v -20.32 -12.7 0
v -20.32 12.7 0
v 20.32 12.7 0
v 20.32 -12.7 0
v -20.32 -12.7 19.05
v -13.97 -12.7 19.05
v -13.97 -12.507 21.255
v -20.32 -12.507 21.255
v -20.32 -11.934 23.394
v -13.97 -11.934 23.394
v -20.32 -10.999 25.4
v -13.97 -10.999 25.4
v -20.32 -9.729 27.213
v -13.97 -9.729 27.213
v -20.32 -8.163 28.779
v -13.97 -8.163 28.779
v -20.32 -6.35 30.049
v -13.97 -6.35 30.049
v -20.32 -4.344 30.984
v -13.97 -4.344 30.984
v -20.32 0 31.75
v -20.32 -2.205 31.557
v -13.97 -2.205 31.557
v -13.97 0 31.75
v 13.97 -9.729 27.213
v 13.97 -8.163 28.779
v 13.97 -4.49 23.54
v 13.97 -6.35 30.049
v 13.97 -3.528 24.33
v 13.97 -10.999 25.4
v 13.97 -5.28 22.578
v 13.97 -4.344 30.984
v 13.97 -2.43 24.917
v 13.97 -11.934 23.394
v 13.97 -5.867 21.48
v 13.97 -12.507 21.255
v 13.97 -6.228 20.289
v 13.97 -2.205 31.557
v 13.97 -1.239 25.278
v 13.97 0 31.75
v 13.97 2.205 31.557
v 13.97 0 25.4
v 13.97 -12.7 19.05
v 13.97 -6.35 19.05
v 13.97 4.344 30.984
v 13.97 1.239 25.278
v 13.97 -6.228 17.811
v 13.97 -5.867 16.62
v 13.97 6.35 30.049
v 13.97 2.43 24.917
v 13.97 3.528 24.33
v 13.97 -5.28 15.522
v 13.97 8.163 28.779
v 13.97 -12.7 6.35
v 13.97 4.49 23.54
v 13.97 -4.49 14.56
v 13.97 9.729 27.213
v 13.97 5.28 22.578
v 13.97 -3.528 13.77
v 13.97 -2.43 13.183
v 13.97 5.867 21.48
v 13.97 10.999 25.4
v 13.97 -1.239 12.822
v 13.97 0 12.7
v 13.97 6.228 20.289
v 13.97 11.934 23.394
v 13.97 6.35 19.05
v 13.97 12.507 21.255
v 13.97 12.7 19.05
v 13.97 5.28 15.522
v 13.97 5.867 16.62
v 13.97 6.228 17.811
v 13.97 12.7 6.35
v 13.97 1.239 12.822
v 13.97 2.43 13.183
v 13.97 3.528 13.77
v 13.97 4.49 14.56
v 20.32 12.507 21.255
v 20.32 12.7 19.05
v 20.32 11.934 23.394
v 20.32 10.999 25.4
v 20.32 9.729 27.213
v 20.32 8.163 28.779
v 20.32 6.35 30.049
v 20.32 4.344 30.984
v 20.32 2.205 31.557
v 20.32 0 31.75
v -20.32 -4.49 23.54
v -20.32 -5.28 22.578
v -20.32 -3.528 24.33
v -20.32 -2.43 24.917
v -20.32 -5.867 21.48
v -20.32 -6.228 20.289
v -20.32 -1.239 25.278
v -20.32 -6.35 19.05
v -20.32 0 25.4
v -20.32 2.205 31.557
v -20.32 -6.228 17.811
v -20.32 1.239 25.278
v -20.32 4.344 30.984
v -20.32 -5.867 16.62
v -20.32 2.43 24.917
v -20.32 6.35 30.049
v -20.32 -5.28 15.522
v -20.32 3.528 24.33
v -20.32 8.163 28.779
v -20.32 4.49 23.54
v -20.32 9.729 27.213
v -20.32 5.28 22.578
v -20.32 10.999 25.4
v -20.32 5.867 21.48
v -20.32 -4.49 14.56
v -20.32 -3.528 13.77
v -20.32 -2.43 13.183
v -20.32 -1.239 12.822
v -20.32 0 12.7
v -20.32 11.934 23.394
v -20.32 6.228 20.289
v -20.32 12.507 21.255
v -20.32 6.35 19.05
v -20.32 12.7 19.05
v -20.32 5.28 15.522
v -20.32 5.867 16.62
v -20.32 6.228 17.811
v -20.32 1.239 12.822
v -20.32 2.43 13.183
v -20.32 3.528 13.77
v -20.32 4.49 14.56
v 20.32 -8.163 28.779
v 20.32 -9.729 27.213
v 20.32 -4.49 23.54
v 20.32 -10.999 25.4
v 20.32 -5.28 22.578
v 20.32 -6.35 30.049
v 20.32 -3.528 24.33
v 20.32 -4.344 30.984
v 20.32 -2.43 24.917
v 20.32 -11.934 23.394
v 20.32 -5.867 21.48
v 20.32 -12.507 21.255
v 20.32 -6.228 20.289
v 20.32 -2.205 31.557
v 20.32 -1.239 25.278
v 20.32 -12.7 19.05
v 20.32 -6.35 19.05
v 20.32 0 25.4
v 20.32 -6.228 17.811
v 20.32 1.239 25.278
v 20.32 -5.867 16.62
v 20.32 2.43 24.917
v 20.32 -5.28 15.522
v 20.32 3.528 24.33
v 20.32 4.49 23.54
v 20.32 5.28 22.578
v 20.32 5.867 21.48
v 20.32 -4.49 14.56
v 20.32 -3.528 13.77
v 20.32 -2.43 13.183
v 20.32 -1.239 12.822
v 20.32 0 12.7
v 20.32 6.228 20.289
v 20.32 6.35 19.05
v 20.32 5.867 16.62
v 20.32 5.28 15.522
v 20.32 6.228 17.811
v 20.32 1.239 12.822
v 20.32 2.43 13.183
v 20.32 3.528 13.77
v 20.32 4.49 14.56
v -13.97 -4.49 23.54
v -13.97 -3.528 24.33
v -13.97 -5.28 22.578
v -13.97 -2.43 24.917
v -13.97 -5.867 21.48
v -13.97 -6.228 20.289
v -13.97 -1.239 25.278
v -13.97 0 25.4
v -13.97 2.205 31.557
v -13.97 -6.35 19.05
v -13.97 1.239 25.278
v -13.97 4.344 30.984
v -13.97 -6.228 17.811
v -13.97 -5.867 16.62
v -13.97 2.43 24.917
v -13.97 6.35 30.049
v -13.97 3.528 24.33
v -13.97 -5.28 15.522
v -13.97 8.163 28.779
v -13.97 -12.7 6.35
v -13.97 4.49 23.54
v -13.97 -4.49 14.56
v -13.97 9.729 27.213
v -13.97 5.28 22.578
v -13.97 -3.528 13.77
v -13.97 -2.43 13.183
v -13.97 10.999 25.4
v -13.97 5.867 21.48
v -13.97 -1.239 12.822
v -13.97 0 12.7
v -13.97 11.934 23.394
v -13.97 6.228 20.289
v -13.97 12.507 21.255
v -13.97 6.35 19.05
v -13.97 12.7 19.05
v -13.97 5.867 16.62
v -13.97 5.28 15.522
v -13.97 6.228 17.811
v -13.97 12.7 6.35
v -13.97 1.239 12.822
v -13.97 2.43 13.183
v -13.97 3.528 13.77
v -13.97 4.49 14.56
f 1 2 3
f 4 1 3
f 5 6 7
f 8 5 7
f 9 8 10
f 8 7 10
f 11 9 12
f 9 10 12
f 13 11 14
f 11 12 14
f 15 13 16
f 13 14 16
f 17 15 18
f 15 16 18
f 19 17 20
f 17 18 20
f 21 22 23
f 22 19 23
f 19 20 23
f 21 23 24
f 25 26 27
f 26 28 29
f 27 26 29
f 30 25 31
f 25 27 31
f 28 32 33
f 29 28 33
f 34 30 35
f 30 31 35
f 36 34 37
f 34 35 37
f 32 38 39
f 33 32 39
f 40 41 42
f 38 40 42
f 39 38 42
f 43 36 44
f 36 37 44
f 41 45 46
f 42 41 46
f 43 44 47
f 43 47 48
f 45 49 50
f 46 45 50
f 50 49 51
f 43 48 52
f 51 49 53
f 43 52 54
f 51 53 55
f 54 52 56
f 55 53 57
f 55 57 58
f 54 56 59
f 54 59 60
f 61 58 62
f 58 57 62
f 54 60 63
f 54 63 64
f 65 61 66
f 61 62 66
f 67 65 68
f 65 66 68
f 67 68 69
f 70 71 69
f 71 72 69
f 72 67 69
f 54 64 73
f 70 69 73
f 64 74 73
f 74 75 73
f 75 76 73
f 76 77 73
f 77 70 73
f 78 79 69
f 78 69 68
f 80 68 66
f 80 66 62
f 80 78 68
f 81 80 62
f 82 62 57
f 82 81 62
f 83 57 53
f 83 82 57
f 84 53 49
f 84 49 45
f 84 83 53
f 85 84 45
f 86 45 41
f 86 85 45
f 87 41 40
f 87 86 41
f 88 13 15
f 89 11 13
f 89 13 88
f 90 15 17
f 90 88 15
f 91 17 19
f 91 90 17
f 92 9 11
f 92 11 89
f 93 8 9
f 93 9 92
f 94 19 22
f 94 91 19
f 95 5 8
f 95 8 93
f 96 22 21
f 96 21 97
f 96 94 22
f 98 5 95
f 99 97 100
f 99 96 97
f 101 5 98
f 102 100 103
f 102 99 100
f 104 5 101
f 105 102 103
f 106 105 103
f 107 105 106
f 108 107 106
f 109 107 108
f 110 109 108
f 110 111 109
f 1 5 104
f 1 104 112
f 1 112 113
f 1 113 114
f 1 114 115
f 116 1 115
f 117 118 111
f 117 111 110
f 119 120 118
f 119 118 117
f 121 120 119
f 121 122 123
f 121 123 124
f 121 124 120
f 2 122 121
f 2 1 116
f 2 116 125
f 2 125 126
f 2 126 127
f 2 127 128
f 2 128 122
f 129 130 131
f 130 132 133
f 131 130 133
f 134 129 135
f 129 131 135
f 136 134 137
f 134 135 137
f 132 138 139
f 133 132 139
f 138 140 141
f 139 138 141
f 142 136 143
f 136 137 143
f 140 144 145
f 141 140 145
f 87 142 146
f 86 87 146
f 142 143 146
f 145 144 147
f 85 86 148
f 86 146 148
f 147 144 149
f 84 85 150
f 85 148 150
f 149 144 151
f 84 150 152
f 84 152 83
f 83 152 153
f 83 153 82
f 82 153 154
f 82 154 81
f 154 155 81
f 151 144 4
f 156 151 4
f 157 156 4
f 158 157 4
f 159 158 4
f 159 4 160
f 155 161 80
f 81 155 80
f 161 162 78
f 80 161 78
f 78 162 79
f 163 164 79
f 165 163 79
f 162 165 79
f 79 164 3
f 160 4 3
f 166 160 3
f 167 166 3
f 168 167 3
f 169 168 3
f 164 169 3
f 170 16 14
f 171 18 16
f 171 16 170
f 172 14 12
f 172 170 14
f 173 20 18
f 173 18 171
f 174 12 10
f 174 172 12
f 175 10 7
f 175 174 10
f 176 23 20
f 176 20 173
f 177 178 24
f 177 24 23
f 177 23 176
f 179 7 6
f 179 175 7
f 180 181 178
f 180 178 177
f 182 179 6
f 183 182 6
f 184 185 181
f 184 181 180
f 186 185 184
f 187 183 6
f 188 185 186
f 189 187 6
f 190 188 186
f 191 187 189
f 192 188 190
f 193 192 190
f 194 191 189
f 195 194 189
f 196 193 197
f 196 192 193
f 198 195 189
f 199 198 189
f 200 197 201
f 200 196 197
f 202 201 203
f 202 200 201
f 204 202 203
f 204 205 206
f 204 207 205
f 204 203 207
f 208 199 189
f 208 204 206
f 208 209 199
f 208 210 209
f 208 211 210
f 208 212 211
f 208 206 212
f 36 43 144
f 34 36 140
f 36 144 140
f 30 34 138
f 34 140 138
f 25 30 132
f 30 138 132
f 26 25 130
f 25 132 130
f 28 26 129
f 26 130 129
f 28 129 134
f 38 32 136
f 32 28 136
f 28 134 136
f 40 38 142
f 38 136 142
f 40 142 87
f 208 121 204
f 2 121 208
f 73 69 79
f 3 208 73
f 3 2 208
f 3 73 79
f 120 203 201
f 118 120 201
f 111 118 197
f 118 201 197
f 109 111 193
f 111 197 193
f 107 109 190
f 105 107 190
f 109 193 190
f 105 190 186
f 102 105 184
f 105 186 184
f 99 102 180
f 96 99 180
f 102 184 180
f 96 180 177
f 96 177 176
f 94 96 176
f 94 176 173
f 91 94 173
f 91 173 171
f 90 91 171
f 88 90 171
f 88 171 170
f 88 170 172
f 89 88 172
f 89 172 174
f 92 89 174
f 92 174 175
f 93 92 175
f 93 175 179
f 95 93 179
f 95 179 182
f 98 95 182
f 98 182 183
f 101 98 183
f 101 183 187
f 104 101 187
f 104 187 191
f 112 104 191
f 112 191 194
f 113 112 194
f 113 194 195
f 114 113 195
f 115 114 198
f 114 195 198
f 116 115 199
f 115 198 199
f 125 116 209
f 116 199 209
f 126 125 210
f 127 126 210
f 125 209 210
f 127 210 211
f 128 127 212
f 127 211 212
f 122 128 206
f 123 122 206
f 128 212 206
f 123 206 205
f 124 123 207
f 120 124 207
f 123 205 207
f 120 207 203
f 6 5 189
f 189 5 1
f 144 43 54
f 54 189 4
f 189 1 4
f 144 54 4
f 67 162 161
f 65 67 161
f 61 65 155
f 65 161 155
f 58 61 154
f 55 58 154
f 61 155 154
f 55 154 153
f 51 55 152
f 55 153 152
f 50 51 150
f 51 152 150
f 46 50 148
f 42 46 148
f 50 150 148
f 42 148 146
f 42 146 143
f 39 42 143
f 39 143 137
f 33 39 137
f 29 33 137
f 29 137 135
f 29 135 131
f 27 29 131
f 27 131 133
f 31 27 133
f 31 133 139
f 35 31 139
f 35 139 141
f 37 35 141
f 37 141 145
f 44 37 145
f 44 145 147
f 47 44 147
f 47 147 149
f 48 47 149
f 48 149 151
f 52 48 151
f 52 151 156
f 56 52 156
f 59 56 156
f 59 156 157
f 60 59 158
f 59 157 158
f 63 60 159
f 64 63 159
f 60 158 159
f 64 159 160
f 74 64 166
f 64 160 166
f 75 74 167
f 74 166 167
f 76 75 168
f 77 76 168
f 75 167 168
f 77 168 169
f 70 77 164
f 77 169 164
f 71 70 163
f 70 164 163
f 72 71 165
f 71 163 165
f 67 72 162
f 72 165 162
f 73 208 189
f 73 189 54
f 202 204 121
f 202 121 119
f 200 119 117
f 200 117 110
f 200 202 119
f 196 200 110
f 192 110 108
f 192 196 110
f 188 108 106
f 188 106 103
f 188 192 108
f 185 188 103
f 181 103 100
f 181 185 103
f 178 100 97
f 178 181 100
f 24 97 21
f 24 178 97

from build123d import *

# Parameters (mm, degrees)
SKETCH1_W           = 40.64
SKETCH1_H           = 25.4
BOSS_EXTRUDE1_DEPTH = 31.75
SKETCH3_W           = 27.94
SKETCH3_H           = 25.4
CUT_EXTRUDE1_DEPTH  = 26.4
SKETCH4_R           = 6.35
CUT_EXTRUDE2_DEPTH  = 41.64
CUT_EXTRUDE3_DEPTH  = 41.64


with BuildPart() as part:
    # Sketch1 → Boss-Extrude1 (new body)
    with BuildSketch(Plane.XY):
        Rectangle(SKETCH1_W, SKETCH1_H)
    extrude(amount=BOSS_EXTRUDE1_DEPTH)

    # Sketch3 → Cut-Extrude1 (cut, through all)
    with BuildSketch(Plane(origin=(0, 12.7, 0), x_dir=(1, 0, 0), z_dir=(0, 1, 0))):
        with Locations((0, -19.05)):
            Rectangle(SKETCH3_W, SKETCH3_H)
    extrude(amount=-CUT_EXTRUDE1_DEPTH, mode=Mode.SUBTRACT)

    # Sketch4 → Cut-Extrude2 (cut, through all)
    with BuildSketch(Plane(origin=(20.32, 0, 0), x_dir=(0, 0, -1), z_dir=(1, 0, 0))):
        with Locations(Location((-19.05, 0, 0), (0, 0, 90))):  # turned: the seam where the file's is
            Circle(SKETCH4_R)
    extrude(amount=-CUT_EXTRUDE2_DEPTH, mode=Mode.SUBTRACT)

    # Sketch5 → Cut-Extrude3 (cut, through all)
    with BuildSketch(Plane(origin=(20.32, 0, 0), x_dir=(0, 0, -1), z_dir=(1, 0, 0))):
        with BuildLine():
            Line((-31.75, 12.7), (-19.05, 12.7))
            ThreePointArc((-19.05, 12.7), (-28.030256121, 8.980256121), (-31.75, 0))
            Line((-31.75, 0), (-31.75, 12.7))
        make_face()
    cut_extrude3 = extrude(amount=-CUT_EXTRUDE3_DEPTH, mode=Mode.SUBTRACT)

    # Mirror1: Cut-Extrude3 across plane
    add(cut_extrude3.mirror(Plane.ZX), mode=Mode.SUBTRACT)


solid = part.part
